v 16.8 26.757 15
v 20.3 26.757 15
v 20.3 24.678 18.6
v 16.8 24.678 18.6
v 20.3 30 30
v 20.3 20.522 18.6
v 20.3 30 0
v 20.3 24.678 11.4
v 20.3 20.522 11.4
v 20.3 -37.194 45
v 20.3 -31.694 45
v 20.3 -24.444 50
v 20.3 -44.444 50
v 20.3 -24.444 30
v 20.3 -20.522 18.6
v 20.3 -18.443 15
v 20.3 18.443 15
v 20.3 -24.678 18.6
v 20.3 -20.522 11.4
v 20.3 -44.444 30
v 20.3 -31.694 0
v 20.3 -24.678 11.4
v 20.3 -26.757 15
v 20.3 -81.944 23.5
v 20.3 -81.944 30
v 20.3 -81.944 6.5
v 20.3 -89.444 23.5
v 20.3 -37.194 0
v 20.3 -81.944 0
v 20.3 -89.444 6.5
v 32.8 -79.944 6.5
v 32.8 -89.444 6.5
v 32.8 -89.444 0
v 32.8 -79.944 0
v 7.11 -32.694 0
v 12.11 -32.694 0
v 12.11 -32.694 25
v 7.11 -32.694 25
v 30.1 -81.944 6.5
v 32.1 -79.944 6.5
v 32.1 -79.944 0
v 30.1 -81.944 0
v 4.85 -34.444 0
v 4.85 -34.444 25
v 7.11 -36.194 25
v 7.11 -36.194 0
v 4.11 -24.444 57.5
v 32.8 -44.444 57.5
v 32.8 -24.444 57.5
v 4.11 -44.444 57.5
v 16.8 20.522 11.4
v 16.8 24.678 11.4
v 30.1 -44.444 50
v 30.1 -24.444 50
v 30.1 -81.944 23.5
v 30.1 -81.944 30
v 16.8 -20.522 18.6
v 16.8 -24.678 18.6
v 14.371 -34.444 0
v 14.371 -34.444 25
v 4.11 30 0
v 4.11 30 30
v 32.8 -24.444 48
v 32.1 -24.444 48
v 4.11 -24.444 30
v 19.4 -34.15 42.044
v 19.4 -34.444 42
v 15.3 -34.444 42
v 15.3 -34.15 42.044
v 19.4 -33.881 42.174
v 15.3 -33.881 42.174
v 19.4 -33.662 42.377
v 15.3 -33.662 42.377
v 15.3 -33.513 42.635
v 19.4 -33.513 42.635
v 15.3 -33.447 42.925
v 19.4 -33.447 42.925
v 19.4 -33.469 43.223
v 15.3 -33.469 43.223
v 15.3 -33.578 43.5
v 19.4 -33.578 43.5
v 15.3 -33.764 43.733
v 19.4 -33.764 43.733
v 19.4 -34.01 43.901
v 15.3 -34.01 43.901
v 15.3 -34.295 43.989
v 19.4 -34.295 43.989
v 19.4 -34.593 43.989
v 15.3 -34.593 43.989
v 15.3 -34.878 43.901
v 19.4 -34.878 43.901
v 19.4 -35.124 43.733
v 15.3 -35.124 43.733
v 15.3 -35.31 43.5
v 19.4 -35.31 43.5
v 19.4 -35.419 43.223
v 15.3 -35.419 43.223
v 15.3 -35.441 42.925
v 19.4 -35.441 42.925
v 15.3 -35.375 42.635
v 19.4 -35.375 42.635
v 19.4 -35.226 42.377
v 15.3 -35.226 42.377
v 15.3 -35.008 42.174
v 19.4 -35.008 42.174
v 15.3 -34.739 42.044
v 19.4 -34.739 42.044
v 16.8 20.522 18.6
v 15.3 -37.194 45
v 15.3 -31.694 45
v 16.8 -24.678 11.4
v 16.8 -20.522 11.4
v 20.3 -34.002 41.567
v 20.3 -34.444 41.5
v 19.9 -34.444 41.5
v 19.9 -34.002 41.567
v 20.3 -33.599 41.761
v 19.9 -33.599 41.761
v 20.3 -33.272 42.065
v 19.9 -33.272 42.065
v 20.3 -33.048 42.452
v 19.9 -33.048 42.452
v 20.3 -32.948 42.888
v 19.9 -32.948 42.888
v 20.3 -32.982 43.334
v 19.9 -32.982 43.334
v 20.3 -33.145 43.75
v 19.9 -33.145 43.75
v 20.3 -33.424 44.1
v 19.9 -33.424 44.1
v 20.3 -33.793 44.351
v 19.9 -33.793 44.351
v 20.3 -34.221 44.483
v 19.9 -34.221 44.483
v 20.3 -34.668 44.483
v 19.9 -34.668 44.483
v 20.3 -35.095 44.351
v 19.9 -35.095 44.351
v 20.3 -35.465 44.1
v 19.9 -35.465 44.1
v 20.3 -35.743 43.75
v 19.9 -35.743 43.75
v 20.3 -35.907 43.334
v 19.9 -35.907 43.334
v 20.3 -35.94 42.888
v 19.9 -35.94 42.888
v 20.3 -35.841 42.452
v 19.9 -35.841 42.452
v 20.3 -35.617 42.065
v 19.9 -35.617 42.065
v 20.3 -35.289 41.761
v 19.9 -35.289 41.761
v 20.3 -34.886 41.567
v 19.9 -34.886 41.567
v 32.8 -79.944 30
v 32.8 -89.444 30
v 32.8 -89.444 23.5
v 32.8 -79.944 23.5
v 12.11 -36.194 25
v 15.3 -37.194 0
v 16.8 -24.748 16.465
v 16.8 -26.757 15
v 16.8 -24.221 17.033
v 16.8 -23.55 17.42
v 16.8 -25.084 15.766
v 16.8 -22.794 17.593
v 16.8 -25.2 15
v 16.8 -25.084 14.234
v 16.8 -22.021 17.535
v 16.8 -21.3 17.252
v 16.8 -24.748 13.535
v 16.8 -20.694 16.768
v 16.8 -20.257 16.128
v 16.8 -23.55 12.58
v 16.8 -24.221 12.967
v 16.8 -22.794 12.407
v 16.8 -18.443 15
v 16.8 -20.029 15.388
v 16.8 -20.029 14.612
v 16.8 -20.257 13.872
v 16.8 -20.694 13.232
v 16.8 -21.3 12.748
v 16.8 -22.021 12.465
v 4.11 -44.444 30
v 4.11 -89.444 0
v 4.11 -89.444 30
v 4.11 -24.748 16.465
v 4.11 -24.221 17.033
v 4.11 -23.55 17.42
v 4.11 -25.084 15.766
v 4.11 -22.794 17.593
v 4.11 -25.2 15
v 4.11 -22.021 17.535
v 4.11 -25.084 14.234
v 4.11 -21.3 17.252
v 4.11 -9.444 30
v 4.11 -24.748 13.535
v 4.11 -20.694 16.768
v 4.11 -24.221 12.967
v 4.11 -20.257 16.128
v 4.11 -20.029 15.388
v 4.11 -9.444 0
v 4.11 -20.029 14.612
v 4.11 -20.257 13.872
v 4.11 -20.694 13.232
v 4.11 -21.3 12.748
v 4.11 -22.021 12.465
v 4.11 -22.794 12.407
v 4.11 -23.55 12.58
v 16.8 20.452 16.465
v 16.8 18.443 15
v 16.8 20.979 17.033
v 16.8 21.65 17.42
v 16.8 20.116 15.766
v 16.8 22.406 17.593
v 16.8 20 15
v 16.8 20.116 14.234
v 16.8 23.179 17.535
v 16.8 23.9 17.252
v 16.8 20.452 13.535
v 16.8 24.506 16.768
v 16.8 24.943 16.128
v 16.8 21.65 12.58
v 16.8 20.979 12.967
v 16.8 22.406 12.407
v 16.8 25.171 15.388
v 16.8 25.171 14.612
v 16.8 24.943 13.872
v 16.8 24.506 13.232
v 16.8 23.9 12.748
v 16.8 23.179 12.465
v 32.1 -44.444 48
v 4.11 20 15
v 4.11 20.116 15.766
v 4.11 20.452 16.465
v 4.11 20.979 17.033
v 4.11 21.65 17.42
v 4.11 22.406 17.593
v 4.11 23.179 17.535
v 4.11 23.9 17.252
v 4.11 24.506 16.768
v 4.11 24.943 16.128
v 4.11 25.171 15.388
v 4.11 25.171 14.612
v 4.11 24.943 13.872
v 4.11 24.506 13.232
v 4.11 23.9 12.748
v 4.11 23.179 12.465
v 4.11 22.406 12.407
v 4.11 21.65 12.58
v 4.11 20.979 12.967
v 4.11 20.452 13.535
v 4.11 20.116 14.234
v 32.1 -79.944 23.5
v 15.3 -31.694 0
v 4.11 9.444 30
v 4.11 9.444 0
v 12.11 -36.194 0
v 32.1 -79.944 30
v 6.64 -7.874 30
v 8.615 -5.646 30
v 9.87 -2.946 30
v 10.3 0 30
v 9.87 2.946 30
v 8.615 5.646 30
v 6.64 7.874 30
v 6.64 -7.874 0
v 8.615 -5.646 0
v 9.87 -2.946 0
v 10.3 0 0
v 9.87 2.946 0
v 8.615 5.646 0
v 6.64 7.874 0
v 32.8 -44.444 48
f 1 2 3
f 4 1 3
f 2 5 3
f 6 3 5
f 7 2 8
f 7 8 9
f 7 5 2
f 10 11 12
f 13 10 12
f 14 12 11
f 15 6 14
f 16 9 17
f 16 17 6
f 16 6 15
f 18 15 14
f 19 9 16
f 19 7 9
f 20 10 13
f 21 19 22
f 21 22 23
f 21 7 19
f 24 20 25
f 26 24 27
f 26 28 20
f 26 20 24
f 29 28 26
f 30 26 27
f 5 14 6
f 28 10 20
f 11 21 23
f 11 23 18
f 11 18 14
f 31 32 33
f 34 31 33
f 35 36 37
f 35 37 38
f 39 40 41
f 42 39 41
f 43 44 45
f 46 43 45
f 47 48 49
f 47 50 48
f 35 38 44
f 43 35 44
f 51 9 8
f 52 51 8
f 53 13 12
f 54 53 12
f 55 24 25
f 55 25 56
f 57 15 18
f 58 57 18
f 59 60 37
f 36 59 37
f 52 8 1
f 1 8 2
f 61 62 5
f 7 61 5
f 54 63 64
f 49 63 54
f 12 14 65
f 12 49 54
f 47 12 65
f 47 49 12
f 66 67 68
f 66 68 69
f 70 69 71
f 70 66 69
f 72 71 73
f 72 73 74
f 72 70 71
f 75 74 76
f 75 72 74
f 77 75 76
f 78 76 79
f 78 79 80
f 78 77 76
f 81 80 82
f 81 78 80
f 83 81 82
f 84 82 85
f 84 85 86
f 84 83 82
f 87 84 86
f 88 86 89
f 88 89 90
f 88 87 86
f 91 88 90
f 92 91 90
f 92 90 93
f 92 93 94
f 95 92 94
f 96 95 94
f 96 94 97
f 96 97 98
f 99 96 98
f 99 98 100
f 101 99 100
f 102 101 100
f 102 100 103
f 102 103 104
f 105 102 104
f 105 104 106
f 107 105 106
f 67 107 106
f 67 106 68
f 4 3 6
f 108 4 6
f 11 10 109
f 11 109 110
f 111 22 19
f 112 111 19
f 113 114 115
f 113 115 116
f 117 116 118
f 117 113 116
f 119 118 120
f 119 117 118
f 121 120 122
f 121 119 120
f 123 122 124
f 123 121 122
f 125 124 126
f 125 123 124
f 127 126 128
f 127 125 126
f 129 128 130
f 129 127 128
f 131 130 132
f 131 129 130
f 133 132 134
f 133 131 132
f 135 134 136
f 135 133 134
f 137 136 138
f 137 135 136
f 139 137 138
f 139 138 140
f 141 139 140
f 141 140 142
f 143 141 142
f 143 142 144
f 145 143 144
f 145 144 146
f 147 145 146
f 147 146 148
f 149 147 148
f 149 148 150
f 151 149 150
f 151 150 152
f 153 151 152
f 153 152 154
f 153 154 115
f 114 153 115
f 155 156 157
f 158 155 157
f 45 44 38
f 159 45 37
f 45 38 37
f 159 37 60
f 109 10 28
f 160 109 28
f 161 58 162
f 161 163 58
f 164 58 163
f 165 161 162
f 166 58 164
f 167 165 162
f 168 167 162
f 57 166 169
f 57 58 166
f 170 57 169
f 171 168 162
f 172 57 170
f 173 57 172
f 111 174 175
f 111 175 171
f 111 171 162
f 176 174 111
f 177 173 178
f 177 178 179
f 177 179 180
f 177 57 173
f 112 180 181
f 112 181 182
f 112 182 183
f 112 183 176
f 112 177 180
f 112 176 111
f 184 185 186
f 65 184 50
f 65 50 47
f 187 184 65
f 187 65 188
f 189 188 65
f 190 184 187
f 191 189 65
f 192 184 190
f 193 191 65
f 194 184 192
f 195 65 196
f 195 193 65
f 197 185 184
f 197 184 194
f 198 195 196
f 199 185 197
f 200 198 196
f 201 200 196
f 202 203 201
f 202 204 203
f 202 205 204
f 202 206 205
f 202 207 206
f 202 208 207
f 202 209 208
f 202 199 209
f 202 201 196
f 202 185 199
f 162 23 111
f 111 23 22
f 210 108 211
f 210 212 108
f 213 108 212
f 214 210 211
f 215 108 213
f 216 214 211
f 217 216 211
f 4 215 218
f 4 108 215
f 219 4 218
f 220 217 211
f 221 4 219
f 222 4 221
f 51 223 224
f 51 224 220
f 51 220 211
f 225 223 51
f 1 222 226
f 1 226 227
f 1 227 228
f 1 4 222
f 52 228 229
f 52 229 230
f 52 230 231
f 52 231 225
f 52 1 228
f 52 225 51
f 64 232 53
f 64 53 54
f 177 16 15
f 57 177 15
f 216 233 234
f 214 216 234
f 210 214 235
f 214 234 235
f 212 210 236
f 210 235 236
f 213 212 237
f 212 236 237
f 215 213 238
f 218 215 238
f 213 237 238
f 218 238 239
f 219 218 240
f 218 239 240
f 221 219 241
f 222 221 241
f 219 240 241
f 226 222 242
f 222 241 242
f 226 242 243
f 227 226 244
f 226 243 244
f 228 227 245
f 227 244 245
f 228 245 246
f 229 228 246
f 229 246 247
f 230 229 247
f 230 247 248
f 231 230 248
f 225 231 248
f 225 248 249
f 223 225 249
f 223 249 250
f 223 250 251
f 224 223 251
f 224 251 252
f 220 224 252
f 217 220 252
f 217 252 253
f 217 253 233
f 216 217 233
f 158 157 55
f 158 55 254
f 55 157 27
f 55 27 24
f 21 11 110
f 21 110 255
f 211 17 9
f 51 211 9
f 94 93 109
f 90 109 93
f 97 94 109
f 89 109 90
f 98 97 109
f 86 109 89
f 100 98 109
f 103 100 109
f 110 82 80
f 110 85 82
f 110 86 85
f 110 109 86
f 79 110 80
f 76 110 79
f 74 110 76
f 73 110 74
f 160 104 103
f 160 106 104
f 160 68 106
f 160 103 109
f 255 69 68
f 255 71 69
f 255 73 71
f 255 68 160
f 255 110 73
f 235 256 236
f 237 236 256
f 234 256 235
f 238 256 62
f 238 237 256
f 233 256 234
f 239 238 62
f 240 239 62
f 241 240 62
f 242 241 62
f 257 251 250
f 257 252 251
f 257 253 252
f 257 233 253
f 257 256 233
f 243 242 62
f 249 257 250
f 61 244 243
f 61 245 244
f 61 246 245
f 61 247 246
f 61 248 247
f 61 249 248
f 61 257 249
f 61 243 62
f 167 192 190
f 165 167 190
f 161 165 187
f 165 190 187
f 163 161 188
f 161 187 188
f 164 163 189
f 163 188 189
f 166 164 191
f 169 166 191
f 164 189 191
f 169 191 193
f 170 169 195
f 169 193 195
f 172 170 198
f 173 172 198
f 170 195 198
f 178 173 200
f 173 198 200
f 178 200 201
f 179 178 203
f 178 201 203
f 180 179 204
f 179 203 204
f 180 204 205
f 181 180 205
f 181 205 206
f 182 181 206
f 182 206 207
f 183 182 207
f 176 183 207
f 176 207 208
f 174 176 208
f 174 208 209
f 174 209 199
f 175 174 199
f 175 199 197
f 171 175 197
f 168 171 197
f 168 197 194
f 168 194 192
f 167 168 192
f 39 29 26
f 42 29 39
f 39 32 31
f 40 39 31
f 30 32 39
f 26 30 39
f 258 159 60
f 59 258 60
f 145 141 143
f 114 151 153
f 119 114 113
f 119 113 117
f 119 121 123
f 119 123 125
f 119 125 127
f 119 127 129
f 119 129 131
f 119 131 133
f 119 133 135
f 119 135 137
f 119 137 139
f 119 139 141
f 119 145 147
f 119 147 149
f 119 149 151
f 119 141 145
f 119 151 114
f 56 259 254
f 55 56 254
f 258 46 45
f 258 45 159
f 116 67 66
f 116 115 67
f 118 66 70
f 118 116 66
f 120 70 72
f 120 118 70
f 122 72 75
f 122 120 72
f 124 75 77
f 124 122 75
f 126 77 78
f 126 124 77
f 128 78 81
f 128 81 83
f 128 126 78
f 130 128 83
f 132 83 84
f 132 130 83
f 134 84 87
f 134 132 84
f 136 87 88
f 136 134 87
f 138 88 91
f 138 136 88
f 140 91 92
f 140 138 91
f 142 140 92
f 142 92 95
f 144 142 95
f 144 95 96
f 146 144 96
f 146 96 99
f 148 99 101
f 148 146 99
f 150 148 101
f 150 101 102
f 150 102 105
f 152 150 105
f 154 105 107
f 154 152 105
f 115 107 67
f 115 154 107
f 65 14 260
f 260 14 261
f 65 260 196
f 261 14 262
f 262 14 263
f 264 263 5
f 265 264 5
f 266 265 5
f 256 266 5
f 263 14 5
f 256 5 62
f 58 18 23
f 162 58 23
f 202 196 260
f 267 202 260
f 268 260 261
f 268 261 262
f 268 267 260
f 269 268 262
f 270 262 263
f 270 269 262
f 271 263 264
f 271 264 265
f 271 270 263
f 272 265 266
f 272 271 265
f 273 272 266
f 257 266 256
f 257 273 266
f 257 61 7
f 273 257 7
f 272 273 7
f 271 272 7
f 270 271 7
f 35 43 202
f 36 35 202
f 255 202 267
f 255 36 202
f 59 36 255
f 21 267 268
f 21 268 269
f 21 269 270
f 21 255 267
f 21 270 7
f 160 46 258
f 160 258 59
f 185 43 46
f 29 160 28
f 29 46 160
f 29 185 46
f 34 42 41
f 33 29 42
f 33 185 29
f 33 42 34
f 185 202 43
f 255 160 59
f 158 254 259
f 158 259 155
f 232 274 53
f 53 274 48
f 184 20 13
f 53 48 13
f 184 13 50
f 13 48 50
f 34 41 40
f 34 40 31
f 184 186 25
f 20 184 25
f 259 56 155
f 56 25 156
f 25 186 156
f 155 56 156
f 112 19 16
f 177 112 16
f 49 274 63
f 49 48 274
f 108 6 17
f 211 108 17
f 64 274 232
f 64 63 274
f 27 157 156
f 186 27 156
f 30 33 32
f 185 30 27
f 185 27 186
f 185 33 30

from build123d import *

# Parameters (mm, degrees)
BOSS_EXTRU_1_DEPTH      = 30
ESQUISSE3_R             = 2.6
ENL_V_MAT_EXTRU_1_DEPTH = 30
ENL_V_MAT_EXTRU_2_DEPTH = 3.5
ESQUISSE6_W             = 16.189542707
ESQUISSE6_H             = 20
BOSS_EXTRU_2_DEPTH      = 27.5
ESQUISSE7_W             = 7.5
ESQUISSE7_H             = 20
BOSS_EXTRU_3_DEPTH      = 12.5
ESQUISSE9_W             = 45
ESQUISSE9_H             = 5.5
ESQUISSE9_R             = 1
ENL_V_MAT_EXTRU_4_DEPTH = 5
ESQUISSE10_R            = 1.5
BOSS_EXTRU_4_DEPTH      = 1.4
CHANFREIN1_SIZE         = 1
ENL_V_MAT_EXTRU_5_DEPTH = 25
ESQUISSE12_W            = 2.7
ESQUISSE12_H            = 20
BOSS_EXTRU_5_DEPTH      = 2
CHANFREIN2_SIZE         = 2
ESQUISSE13_W            = 2.7
ESQUISSE13_H            = 30
BOSS_EXTRU_6_DEPTH      = 2
CHANFREIN3_SIZE         = 2
ENL_V_START             = -12.5
ESQUISSE15_W            = 17
ESQUISSE15_H            = 9.5
ENL_V_MAT_EXTRU_6_DEPTH = 12.5


# Some blends are built 0.0001 mm under size
with BuildPart() as part:
    # Esquisse1 → Boss.-Extru.1 (new body)
    with BuildSketch(Plane.XY):
        with BuildLine():
            Line((4.110457293, 9.444264971), (4.110457293, 30))
            Line((4.110457293, 30), (20.3, 30))
            Line((20.3, 30), (20.3, -81.944264971))
            Line((20.3, -81.944264971), (32.8, -81.944264971))
            Line((32.8, -81.944264971), (32.8, -89.444264971))
            Line((32.8, -89.444264971), (4.110457293, -89.444264971))
            Line((4.110457293, -89.444264971), (4.110457293, -9.444264971))
            ThreePointArc((4.110457293, -9.444264971), (10.3, 0), (4.110457293, 9.444264971))
        make_face()
    extrude(amount=BOSS_EXTRU_1_DEPTH)

    # Esquisse3 → Enlèv. mat.-Extru.1 (cut)
    with BuildSketch(Plane.ZY.offset(-4.110457293)):
        with Locations(Location((15, 22.6, 0), (0, 0, 270))):
            Circle(ESQUISSE3_R)
        with Locations(Location((15, -22.6, 0), (0, 0, 270))):
            Circle(ESQUISSE3_R)
    extrude(amount=-ENL_V_MAT_EXTRU_1_DEPTH, mode=Mode.SUBTRACT)

    # Esquisse4 → Enlèv. mat.-Extru.2 (cut)
    with BuildSketch(Plane(origin=(20.3, 0, 0), x_dir=(0, 0, -1), z_dir=(1, 0, 0))):
        Polygon((-15, -18.443078062), (-18.6, -20.521539031), (-18.6, -24.678460969), (-15, -26.756921938), (-11.4, -24.678460969), (-11.4, -20.521539031), align=None)
        Polygon((-15, 26.756921938), (-18.6, 24.678460969), (-18.6, 20.521539031), (-15, 18.443078062), (-11.4, 20.521539031), (-11.4, 24.678460969), align=None)
    extrude(amount=-ENL_V_MAT_EXTRU_2_DEPTH, mode=Mode.SUBTRACT)

    # Esquisse6 → Boss.-Extru.2 (add)
    with BuildSketch(Plane.XY.offset(30)):
        with Locations((12.205228647, -34.444264971)):
            Rectangle(ESQUISSE6_W, ESQUISSE6_H)
    extrude(amount=BOSS_EXTRU_2_DEPTH)

    # Esquisse7 → Boss.-Extru.3 (add)
    with BuildSketch(Plane(origin=(20.3, 0, 0), x_dir=(0, 0, -1), z_dir=(1, 0, 0))):
        with Locations((-53.75, -34.444264971)):
            Rectangle(ESQUISSE7_W, ESQUISSE7_H)
    extrude(amount=BOSS_EXTRU_3_DEPTH)

    # Esquisse9 → Enlèv. mat.-Extru.4 (cut)
    with BuildSketch(Plane(origin=(20.3, 0, 0), x_dir=(0, 0, -1), z_dir=(1, 0, 0))):
        with Locations((-22.5, -34.444264971)):
            Rectangle(ESQUISSE9_W, ESQUISSE9_H)
        with Locations((-43, -34.444264971)):
            Circle(ESQUISSE9_R, mode=Mode.SUBTRACT)
    extrude(amount=-ENL_V_MAT_EXTRU_4_DEPTH, mode=Mode.SUBTRACT)

    # Esquisse10 → Boss.-Extru.4 (add)
    with BuildSketch(Plane(origin=(20.3, 0, 0), x_dir=(0, 0, -1), z_dir=(1, 0, 0))):
        with Locations((-43, -34.444264971)):
            Circle(ESQUISSE10_R)
    extrude(amount=-BOSS_EXTRU_4_DEPTH)

    # Chanfrein1
    # the kernel refuses this chamfer: 1 mm, written as the material it takes off along each edge
    with BuildSketch(Plane(origin=(18.9, -34.444264971, 43), x_dir=(0, 0, -1), z_dir=(0, -1, 0))) as chanfrein1_piece_1_section:
        Polygon((1.5 - CHANFREIN1_SIZE, 0), (1.5, CHANFREIN1_SIZE), (1.5, 0), align=None)
    chanfrein1_piece_1 = revolve(axis=Axis((18.9, -34.444264971, 43), (1, 0, 0)), mode=Mode.PRIVATE)
    chanfrein1_piece_1 = chanfrein1_piece_1 - Plane(origin=(19.653593842, -34.444264971, 43), x_dir=(0, 0, -1), z_dir=(1, 0, 0)) * Cylinder(1, 7, mode=Mode.PRIVATE)
    add(chanfrein1_piece_1, mode=Mode.SUBTRACT)

    # Esquisse11 → Enlèv. mat.-Extru.5 (cut)
    with BuildSketch(Plane(origin=(0, 0, 0), x_dir=(-1, 0, 0), z_dir=(0, 0, -1))):
        Polygon((-12.110457293, -32.694264971), (-7.110457293, -32.694264971), (-4.850170078, -34.444264971), (-7.110457293, -36.194264971), (-12.110457293, -36.194264971), (-14.370744508, -34.444264971), align=None)
    extrude(amount=-ENL_V_MAT_EXTRU_5_DEPTH, mode=Mode.SUBTRACT)

    # Esquisse12 → Boss.-Extru.5 (add)
    with BuildSketch(Plane(origin=(0, 0, 50), x_dir=(-1, 0, 0), z_dir=(0, 0, -1))):
        with Locations((-31.45, -34.444264971)):
            Rectangle(ESQUISSE12_W, ESQUISSE12_H)
    extrude(amount=BOSS_EXTRU_5_DEPTH)

    # Chanfrein2
    chanfrein2_edges = [part.edges().sort_by_distance(p)[0] for p in [
        (30.1, -34.444264971, 48),
    ]]
    chamfer(chanfrein2_edges, length=CHANFREIN2_SIZE - 0.0001)  # a hair under: the kernel refuses the full size

    # Esquisse13 → Boss.-Extru.6 (add)
    with BuildSketch(Plane(origin=(0, -81.944264971, 0), x_dir=(1, 0, 0), z_dir=(0, 1, 0))):
        with Locations((31.45, -15)):
            Rectangle(ESQUISSE13_W, ESQUISSE13_H)
    extrude(amount=BOSS_EXTRU_6_DEPTH)

    # Chanfrein3
    chanfrein3_edges = [part.edges().sort_by_distance(p)[0] for p in [
        (30.1, -79.944264971, 15),
    ]]
    chamfer(chanfrein3_edges, length=CHANFREIN3_SIZE - 0.0001)  # a hair under: the kernel refuses the full size

    # Esquisse15 → Enlèv. mat.-Extru.6 (cut)
    with BuildSketch(Plane(origin=(32.8, 0, 0), x_dir=(0, 0, -1), z_dir=(1, 0, 0)).offset(ENL_V_START)):
        with Locations((-15, -84.694264971)):
            Rectangle(ESQUISSE15_W, ESQUISSE15_H)
    extrude(amount=ENL_V_MAT_EXTRU_6_DEPTH, mode=Mode.SUBTRACT)


solid = part.part
